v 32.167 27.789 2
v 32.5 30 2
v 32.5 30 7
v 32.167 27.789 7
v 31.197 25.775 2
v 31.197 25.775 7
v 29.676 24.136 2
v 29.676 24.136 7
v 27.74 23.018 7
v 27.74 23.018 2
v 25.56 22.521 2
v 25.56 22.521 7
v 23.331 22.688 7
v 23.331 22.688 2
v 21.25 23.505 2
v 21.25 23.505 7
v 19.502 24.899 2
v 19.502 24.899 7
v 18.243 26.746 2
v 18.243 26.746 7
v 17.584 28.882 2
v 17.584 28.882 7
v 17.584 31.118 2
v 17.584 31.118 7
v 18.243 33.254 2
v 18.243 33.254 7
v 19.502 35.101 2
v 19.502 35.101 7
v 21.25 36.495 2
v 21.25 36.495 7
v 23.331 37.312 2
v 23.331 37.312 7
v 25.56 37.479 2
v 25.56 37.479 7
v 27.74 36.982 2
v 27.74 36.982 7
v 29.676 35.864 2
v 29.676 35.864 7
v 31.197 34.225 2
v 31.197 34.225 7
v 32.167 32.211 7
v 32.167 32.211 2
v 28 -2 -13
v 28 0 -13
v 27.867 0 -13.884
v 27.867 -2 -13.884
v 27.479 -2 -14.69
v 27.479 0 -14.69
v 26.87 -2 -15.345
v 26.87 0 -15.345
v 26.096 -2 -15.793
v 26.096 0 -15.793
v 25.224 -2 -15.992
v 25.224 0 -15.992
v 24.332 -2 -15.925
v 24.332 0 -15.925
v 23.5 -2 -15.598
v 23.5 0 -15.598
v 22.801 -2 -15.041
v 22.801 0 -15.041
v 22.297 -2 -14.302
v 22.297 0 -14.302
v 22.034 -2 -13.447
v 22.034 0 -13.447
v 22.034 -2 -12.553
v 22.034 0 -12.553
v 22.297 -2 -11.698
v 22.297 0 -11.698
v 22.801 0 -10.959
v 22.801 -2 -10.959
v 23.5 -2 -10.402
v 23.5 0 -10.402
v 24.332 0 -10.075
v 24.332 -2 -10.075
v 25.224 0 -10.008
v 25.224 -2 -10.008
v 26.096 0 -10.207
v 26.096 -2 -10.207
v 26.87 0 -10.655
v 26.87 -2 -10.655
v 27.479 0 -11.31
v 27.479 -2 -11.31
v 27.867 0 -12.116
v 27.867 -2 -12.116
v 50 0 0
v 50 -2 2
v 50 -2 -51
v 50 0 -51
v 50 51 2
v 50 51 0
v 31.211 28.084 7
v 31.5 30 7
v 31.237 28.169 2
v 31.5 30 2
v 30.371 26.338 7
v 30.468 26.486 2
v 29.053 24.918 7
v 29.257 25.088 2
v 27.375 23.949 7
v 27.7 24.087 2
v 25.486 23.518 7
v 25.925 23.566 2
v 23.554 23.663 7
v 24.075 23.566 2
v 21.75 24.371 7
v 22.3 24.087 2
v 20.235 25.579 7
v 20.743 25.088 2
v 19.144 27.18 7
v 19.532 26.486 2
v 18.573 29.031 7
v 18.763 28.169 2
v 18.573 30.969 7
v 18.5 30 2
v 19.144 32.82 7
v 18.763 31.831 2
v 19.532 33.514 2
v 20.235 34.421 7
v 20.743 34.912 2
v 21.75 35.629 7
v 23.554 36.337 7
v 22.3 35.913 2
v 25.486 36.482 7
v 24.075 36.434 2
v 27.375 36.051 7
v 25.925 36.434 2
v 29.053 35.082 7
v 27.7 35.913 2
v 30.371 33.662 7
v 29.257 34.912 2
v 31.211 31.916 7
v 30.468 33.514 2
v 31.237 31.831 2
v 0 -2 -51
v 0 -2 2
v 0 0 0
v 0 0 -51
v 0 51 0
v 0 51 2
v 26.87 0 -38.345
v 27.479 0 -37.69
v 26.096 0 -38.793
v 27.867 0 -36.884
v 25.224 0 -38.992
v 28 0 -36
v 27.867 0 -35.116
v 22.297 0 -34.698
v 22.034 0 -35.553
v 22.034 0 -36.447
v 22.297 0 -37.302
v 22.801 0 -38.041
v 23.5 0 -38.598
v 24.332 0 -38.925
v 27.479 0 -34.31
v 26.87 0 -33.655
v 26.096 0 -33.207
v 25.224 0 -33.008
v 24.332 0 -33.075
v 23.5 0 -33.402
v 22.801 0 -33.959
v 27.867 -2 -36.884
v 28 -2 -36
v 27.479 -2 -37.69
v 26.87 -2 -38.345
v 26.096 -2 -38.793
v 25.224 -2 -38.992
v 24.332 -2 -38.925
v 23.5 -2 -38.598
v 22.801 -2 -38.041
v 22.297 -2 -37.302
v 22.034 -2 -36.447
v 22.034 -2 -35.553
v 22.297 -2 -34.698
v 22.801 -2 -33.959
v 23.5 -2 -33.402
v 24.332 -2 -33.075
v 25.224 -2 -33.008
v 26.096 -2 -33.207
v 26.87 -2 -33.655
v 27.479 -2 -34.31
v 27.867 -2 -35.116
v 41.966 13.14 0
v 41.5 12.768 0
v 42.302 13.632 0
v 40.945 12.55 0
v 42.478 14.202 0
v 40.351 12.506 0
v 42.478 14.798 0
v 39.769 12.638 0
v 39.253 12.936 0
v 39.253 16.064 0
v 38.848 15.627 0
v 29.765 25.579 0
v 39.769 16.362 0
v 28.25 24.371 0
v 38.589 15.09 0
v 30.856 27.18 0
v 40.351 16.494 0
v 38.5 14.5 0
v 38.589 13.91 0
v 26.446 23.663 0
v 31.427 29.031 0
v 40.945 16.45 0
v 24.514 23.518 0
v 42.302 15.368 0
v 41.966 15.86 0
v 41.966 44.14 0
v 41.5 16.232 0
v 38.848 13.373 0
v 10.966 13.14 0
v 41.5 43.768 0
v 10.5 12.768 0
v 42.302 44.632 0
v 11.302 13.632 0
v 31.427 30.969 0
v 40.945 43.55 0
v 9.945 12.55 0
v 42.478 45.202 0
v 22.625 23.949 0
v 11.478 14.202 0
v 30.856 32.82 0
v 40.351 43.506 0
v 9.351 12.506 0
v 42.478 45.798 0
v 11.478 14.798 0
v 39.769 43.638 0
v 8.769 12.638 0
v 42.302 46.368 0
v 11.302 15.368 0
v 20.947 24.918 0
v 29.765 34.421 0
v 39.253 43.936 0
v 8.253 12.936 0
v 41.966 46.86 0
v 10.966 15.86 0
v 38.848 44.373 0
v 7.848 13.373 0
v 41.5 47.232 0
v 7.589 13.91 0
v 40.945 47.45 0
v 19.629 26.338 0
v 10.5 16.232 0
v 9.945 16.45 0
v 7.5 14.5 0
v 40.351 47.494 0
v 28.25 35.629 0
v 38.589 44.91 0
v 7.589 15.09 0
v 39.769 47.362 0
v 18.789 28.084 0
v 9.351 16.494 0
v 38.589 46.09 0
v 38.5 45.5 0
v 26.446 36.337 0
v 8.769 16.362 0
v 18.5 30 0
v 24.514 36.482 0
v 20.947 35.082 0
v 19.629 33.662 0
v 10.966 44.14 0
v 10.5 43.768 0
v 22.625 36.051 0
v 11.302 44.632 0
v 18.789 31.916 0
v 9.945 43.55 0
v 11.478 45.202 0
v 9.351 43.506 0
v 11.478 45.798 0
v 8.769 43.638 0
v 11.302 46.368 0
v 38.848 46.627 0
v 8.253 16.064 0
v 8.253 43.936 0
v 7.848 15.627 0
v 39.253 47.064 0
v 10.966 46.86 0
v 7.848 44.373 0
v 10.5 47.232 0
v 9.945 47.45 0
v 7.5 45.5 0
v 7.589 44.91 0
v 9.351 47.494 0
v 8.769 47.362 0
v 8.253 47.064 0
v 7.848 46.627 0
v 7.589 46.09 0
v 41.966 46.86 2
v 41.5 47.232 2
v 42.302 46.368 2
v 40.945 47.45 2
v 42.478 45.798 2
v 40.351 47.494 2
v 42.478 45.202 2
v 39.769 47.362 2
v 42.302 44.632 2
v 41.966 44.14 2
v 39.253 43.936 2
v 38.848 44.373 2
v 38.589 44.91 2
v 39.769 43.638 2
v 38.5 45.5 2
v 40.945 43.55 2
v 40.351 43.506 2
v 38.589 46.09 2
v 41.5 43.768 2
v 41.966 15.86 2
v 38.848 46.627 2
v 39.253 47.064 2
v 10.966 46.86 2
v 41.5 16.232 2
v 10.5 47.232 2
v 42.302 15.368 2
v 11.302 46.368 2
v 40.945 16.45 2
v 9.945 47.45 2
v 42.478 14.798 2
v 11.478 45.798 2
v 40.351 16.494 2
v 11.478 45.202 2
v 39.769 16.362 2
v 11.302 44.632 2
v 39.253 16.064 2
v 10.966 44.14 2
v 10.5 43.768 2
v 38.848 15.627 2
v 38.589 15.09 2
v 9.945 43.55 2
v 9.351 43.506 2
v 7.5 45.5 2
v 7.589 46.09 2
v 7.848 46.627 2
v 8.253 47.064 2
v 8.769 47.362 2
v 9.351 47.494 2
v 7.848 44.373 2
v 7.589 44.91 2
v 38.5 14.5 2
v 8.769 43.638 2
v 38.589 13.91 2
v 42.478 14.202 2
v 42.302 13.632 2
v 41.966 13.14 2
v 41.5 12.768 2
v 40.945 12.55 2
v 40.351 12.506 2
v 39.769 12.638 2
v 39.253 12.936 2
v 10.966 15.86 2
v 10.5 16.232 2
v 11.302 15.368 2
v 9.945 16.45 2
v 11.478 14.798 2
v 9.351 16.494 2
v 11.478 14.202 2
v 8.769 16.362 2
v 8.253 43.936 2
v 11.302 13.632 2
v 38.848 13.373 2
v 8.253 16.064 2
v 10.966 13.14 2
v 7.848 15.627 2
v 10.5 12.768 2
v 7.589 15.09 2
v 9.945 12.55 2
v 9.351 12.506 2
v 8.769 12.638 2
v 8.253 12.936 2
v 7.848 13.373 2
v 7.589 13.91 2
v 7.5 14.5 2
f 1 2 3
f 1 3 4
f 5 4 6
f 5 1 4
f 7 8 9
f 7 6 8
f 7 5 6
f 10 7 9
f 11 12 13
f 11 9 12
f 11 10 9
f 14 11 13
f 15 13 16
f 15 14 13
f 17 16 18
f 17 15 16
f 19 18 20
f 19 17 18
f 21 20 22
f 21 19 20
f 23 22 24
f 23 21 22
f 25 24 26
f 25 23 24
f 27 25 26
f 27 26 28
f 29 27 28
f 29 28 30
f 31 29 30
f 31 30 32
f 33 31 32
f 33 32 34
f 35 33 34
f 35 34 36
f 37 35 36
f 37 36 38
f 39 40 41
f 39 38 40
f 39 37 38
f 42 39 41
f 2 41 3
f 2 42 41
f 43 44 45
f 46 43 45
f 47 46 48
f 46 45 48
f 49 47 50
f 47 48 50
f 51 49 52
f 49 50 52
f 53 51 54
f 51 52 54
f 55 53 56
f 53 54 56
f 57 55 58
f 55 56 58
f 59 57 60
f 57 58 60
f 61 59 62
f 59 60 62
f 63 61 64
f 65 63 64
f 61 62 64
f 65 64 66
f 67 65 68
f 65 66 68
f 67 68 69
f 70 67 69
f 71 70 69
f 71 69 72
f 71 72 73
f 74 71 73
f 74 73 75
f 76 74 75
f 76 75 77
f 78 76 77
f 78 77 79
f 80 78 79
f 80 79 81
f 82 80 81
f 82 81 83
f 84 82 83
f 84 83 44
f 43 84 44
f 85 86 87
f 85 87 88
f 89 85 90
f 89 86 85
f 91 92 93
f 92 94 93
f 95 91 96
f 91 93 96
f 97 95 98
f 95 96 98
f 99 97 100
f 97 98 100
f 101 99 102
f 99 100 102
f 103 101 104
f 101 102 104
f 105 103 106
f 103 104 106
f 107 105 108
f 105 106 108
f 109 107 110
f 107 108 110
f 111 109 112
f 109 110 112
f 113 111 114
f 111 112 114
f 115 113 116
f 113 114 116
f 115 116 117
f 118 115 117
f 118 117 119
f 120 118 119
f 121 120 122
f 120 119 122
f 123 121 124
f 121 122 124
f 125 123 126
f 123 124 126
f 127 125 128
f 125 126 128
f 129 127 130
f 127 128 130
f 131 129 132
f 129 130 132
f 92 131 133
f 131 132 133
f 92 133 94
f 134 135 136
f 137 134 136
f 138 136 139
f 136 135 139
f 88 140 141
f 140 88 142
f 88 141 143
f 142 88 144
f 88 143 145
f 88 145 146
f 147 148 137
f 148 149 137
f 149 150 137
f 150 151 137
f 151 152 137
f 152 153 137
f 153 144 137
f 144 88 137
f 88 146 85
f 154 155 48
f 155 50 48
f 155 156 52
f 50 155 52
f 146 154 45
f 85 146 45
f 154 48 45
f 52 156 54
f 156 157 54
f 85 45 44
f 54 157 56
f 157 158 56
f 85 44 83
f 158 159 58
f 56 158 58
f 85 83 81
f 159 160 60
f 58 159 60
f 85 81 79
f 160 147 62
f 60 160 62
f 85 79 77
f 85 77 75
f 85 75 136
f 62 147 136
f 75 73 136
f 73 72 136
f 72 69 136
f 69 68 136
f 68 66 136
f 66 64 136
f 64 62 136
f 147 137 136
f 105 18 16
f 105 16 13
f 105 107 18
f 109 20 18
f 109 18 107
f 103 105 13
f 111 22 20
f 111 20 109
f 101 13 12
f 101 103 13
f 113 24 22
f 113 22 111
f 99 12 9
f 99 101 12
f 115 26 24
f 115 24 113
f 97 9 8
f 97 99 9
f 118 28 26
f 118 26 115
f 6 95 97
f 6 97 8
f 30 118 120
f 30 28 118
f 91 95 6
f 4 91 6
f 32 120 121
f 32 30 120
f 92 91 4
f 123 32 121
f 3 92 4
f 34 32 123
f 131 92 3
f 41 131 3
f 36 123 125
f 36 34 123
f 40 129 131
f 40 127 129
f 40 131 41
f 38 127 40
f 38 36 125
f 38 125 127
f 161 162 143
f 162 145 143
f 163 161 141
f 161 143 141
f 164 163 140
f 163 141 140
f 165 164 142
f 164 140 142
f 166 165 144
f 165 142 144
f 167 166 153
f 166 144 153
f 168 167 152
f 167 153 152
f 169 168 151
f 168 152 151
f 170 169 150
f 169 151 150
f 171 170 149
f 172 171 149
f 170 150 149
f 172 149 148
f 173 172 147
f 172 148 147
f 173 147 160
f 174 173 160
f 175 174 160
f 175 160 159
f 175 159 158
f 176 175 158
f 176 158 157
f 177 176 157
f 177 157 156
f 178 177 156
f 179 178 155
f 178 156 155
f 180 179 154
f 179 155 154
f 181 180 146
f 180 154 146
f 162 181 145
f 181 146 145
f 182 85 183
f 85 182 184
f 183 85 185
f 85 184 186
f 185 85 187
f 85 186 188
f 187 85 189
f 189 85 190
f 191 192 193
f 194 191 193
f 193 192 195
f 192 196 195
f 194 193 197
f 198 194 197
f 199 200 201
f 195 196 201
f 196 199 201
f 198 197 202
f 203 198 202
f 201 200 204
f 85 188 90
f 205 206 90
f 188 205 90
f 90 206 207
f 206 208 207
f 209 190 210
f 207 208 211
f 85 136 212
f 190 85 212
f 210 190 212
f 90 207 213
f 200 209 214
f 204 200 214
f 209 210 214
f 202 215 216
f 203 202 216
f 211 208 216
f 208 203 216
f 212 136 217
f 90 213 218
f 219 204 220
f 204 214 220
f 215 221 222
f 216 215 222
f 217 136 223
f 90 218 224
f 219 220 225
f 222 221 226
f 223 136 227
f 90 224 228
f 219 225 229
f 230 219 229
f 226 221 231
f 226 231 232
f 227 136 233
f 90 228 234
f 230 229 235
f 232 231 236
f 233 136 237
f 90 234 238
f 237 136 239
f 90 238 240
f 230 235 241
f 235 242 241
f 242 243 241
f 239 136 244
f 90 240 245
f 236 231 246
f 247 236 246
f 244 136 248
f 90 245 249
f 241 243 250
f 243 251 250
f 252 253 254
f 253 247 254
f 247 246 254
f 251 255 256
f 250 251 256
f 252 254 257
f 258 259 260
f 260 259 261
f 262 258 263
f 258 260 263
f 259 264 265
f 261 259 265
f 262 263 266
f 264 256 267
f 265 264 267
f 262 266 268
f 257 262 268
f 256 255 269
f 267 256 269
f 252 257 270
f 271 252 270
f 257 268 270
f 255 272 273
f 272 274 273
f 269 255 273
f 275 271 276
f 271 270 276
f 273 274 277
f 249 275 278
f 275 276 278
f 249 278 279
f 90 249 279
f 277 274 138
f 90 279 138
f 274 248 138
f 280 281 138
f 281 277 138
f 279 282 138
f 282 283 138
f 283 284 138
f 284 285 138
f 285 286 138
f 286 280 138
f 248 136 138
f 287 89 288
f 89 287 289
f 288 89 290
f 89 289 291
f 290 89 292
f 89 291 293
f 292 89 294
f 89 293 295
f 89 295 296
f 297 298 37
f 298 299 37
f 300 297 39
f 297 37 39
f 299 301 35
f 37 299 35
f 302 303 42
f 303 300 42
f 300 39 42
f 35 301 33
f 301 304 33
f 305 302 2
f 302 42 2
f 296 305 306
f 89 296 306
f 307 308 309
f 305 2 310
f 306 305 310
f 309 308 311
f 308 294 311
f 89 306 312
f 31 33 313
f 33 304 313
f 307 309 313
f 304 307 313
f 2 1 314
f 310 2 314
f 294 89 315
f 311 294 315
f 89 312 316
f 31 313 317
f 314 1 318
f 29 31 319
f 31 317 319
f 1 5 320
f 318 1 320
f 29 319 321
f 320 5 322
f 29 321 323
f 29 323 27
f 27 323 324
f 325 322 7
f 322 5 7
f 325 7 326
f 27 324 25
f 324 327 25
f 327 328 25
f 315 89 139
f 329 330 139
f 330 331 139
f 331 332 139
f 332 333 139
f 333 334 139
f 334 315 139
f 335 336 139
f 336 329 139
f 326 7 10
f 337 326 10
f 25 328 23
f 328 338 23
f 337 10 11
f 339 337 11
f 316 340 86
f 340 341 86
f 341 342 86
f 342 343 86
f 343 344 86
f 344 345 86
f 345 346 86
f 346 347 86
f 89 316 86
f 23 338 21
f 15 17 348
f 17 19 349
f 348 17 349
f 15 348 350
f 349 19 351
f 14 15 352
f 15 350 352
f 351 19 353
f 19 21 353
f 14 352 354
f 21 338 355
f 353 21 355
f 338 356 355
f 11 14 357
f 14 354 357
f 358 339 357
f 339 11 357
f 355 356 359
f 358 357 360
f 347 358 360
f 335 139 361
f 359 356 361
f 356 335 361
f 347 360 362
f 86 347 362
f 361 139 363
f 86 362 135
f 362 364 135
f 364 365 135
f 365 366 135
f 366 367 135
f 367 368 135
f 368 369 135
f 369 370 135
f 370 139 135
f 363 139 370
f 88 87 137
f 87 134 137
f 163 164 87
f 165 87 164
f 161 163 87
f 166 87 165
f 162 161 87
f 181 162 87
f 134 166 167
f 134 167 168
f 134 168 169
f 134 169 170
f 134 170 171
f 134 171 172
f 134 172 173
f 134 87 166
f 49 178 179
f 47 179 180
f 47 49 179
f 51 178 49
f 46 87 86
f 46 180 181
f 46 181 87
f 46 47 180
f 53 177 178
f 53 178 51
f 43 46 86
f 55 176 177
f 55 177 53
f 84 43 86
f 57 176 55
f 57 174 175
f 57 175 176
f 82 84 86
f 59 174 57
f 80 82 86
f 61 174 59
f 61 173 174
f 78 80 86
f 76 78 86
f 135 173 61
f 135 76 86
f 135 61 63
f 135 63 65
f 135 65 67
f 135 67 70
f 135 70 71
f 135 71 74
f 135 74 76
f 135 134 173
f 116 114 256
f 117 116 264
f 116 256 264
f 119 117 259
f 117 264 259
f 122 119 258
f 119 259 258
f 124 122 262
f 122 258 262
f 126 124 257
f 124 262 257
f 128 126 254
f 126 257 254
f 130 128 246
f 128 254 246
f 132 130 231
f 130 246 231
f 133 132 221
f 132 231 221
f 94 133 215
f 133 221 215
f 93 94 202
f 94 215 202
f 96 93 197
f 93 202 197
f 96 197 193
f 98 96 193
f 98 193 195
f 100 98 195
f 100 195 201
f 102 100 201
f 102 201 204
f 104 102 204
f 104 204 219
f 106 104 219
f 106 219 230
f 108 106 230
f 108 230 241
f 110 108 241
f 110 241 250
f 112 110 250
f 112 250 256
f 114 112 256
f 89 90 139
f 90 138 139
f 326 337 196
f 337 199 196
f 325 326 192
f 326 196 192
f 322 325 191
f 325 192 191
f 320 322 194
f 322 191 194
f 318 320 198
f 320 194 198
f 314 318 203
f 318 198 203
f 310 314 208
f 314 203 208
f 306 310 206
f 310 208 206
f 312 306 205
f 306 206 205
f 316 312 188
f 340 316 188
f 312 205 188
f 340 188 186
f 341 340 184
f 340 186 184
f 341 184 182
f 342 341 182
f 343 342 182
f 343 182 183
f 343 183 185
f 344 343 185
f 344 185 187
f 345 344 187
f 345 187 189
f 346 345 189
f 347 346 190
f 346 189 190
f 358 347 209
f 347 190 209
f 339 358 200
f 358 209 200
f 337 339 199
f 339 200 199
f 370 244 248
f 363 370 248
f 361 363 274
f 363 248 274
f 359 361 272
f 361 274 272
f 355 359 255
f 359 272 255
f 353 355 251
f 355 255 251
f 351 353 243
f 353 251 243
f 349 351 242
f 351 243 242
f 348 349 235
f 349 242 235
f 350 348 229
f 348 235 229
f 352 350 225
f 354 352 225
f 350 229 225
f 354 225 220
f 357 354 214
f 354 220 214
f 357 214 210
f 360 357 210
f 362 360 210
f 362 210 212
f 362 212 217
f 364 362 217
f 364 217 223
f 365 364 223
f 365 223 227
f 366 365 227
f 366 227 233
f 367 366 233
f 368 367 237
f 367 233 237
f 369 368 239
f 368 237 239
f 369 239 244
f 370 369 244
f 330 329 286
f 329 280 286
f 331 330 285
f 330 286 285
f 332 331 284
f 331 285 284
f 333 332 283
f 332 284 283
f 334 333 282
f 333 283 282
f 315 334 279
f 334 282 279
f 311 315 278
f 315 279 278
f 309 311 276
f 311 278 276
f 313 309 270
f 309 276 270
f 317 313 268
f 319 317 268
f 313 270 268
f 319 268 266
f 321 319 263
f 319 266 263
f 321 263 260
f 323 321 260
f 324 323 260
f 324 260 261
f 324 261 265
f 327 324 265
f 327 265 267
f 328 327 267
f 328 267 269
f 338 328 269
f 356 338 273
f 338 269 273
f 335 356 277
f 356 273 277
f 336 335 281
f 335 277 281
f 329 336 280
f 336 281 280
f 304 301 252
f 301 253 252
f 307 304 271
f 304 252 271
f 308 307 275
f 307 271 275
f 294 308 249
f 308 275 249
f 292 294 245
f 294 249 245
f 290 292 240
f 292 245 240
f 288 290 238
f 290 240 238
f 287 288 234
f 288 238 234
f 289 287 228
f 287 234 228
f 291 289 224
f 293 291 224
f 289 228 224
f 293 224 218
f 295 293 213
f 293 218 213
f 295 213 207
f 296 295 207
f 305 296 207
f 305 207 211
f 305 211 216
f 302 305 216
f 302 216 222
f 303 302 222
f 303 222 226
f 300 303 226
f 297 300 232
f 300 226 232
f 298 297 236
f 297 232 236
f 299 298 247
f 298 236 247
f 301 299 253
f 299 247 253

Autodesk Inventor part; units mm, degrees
ref_plane "YZ Plane" through (0, 0, 0) normal (1, 0, 0) x (0, 1, 0)
ref_plane "XZ Plane" through (0, 0, 0) normal (0, 1, 0) x (-1, 0, 0)
ref_plane "XY Plane" through (0, 0, 0) normal (0, 0, 1) x (1, 0, 0)
sketch "Sketch1" plane through (0, 0, 0) normal (1, 0, 0) x (0, 1, 0)
  line L0 (0, 0) -> (51, 0)
  line L1 (51, 0) -> (51, 2)
  line L2 (51, 2) -> (0, 2)
  line L3 (-2, 0) -> (-2, -51)
  line L4 (-2, -51) -> (0, -51)
  line L5 (0, -51) -> (0, 0)
  line L6 (0, 0) -> (-2, 0)
  line L7 (-2, 0) -> (-2, 2)
  line L8 (-2, 2) -> (0, 2)
  line L9 (0, 2) -> (0, 0)
  dimension "d0" = 51
  dimension "d1" = 2
  dimension "d2" = 2
  dimension "d3" = 51
extrude "Extrusion1" add sketch "Sketch1" along normal blind 50
sketch "Sketch2" plane through (0, 0, 0) normal (0, 0, -1) x (-1, 0, 0)
  line L0 (0, 51) -> (-50, 51) projected
  line L1 (-25, 51) -> (-25, 30)
  circle A0 centre (-25, 30) radius 6.5
  line L2 (-25, 51) -> (-9.5, 51)
  line L3 (-25, 30) -> (-9.5, 30)
  line L4 (-9.5, 30) -> (-9.5, 45.5)
  line L5 (-9.5, 30) -> (-9.5, 14.5)
  circle A1 centre (-9.5, 14.5) radius 2
  circle A2 centre (-9.5, 45.5) radius 2
  circle A3 centre (-40.5, 14.5) radius 2
  circle A4 centre (-40.5, 45.5) radius 2
  point P0 (0, 0)
  dimension "d6" = 21
  dimension "d7" = 13
  dimension "d8" = 15.5
  dimension "d9" = 15.5
  dimension "d10" = 15.5
  dimension "d11" = 4
  dimension "d12" = 4
extrude "Extrusion2" cut sketch "Sketch2" against normal blind 50
sketch "Sketch3" plane through (0, 0, 0) normal (0, 1, 0) x (1, 0, 0)
  line L0 (0, 51) -> (50, 51) projected
  line L1 (25, 51) -> (25, 36)
  line L2 (25, 36) -> (25, 13)
  circle A0 centre (25, 13) radius 3
  circle A1 centre (25, 36) radius 3
  point P0 (0, 0)
  dimension "d15" = 15
  dimension "d16" = 23
  dimension "d17" = 6
  dimension "d18" = 6
extrude "Extrusion3" cut sketch "Sketch3" against normal blind 50
sketch "Sketch4" plane through (0, -2, 2) normal (0, 0, 1) x (1, 0, 0)
  circle A0 centre (25, 32) radius 6.5 projected
  circle A1 centre (25, 32) radius 7.5
  circle A2 centre (25, 32) radius 6.5
  point P0 (0, 2)
  dimension "d21" = 15
extrude "Extrusion4" add sketch "Sketch4" along normal blind 5
properties part number "NEMA17-3030-m6-holder" material "Aluminum 6061"
